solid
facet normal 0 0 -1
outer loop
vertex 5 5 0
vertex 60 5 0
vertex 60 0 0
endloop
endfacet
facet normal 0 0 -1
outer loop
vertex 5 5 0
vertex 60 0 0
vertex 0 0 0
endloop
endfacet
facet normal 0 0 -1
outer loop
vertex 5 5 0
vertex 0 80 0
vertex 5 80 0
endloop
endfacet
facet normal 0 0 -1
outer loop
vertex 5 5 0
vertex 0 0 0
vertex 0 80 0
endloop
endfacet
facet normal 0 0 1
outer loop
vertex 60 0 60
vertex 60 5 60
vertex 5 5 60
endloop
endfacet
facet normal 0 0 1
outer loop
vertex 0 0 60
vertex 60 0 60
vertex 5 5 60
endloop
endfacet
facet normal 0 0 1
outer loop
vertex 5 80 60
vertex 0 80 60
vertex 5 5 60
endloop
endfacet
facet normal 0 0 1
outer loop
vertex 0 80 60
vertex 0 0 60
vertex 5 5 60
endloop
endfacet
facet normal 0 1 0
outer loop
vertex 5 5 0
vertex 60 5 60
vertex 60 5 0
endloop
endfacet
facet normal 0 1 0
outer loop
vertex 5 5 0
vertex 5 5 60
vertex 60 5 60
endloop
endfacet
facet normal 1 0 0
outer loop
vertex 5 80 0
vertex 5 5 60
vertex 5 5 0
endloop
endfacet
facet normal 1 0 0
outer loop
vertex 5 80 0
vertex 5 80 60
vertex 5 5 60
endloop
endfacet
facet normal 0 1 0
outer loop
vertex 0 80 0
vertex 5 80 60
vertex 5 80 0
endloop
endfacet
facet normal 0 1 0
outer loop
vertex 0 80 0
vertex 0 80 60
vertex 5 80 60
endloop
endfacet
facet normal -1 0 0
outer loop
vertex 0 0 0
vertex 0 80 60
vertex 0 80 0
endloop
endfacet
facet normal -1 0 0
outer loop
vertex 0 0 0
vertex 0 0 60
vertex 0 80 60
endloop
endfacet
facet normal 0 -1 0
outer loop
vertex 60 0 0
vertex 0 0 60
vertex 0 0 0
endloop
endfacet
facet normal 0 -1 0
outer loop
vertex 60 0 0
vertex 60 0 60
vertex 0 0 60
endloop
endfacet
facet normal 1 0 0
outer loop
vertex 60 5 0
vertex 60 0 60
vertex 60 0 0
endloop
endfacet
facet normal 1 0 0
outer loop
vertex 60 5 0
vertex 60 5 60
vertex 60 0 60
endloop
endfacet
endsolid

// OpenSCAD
$fn = 32;

// ----------------------------------------------------------------------
// Structural section: angle 60 x 80 mm
// ----------------------------------------------------------------------

// --- parameters (mm) ---
sec_w = 60;               // leg width, X
sec_h = 80;               // leg height, Y
flange_t = 5;             // leg thickness
plate_t = 60;             // cut length, Z (extrusion height)

profile = [[0, 0], [60, 0], [60, 5], [5, 5], [5, 80], [0, 80]];  // primary outline, 6 points, counter clockwise

// --- the one profile operation ---
linear_extrude(height = plate_t) polygon(points = profile);
